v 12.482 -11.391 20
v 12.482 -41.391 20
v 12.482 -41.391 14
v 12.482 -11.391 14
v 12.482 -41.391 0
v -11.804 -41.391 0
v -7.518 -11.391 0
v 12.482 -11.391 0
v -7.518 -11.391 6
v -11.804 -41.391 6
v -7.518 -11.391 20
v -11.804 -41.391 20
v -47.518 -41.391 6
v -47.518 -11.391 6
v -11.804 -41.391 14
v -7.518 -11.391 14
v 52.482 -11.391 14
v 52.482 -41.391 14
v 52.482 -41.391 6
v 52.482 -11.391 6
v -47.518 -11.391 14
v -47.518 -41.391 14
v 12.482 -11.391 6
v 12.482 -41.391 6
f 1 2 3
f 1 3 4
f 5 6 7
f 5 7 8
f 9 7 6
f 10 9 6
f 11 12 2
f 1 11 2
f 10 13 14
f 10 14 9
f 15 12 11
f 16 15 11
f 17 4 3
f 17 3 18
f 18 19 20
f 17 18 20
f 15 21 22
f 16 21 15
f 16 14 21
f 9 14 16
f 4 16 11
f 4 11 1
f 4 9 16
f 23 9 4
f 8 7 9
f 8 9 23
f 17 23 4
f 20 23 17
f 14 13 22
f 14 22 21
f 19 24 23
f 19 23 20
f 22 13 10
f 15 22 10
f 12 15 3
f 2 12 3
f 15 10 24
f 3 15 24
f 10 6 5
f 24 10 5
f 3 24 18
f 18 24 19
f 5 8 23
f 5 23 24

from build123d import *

# Parameters (mm, degrees)
F0_W     = 100
F0_H     = 30
F1_DEPTH = 20
F2_W     = 40
F2_H     = 30
F3_DEPTH = 6
F4_W     = 40
F4_H     = 30
F5_DEPTH = 6


with BuildPart() as f1:
    # F0 (on Top) → F1 (new body)
    with BuildSketch(Plane.XY):
        with Locations((2.482062, -26.390521)):
            Rectangle(F0_W, F0_H)
    extrude(amount=F1_DEPTH)

    # F2 (on face) → F3 (cut)
    with BuildSketch(Plane.XY.offset(20)):
        Polygon((-11.803652, -41.390521), (-7.517938, -11.390521), (-47.517938, -11.390521), (-47.517938, -41.390521), align=None)
        with Locations((32.482062, -26.390521)):
            Rectangle(F2_W, F2_H)
    extrude(amount=-F3_DEPTH, mode=Mode.SUBTRACT)

    # F4 (on face) → F5 (cut)
    with BuildSketch(Plane(origin=(0, 0, 0), x_dir=(1, 0, 0), z_dir=(0, 0, -1))):
        Polygon((-7.517938, 11.390521), (-11.803652, 41.390521), (-47.517938, 41.390521), (-47.517938, 11.390521), align=None)
        with Locations((32.482062, 26.390521)):
            Rectangle(F4_W, F4_H)
    extrude(amount=-F5_DEPTH, mode=Mode.SUBTRACT)


solid = f1.part
